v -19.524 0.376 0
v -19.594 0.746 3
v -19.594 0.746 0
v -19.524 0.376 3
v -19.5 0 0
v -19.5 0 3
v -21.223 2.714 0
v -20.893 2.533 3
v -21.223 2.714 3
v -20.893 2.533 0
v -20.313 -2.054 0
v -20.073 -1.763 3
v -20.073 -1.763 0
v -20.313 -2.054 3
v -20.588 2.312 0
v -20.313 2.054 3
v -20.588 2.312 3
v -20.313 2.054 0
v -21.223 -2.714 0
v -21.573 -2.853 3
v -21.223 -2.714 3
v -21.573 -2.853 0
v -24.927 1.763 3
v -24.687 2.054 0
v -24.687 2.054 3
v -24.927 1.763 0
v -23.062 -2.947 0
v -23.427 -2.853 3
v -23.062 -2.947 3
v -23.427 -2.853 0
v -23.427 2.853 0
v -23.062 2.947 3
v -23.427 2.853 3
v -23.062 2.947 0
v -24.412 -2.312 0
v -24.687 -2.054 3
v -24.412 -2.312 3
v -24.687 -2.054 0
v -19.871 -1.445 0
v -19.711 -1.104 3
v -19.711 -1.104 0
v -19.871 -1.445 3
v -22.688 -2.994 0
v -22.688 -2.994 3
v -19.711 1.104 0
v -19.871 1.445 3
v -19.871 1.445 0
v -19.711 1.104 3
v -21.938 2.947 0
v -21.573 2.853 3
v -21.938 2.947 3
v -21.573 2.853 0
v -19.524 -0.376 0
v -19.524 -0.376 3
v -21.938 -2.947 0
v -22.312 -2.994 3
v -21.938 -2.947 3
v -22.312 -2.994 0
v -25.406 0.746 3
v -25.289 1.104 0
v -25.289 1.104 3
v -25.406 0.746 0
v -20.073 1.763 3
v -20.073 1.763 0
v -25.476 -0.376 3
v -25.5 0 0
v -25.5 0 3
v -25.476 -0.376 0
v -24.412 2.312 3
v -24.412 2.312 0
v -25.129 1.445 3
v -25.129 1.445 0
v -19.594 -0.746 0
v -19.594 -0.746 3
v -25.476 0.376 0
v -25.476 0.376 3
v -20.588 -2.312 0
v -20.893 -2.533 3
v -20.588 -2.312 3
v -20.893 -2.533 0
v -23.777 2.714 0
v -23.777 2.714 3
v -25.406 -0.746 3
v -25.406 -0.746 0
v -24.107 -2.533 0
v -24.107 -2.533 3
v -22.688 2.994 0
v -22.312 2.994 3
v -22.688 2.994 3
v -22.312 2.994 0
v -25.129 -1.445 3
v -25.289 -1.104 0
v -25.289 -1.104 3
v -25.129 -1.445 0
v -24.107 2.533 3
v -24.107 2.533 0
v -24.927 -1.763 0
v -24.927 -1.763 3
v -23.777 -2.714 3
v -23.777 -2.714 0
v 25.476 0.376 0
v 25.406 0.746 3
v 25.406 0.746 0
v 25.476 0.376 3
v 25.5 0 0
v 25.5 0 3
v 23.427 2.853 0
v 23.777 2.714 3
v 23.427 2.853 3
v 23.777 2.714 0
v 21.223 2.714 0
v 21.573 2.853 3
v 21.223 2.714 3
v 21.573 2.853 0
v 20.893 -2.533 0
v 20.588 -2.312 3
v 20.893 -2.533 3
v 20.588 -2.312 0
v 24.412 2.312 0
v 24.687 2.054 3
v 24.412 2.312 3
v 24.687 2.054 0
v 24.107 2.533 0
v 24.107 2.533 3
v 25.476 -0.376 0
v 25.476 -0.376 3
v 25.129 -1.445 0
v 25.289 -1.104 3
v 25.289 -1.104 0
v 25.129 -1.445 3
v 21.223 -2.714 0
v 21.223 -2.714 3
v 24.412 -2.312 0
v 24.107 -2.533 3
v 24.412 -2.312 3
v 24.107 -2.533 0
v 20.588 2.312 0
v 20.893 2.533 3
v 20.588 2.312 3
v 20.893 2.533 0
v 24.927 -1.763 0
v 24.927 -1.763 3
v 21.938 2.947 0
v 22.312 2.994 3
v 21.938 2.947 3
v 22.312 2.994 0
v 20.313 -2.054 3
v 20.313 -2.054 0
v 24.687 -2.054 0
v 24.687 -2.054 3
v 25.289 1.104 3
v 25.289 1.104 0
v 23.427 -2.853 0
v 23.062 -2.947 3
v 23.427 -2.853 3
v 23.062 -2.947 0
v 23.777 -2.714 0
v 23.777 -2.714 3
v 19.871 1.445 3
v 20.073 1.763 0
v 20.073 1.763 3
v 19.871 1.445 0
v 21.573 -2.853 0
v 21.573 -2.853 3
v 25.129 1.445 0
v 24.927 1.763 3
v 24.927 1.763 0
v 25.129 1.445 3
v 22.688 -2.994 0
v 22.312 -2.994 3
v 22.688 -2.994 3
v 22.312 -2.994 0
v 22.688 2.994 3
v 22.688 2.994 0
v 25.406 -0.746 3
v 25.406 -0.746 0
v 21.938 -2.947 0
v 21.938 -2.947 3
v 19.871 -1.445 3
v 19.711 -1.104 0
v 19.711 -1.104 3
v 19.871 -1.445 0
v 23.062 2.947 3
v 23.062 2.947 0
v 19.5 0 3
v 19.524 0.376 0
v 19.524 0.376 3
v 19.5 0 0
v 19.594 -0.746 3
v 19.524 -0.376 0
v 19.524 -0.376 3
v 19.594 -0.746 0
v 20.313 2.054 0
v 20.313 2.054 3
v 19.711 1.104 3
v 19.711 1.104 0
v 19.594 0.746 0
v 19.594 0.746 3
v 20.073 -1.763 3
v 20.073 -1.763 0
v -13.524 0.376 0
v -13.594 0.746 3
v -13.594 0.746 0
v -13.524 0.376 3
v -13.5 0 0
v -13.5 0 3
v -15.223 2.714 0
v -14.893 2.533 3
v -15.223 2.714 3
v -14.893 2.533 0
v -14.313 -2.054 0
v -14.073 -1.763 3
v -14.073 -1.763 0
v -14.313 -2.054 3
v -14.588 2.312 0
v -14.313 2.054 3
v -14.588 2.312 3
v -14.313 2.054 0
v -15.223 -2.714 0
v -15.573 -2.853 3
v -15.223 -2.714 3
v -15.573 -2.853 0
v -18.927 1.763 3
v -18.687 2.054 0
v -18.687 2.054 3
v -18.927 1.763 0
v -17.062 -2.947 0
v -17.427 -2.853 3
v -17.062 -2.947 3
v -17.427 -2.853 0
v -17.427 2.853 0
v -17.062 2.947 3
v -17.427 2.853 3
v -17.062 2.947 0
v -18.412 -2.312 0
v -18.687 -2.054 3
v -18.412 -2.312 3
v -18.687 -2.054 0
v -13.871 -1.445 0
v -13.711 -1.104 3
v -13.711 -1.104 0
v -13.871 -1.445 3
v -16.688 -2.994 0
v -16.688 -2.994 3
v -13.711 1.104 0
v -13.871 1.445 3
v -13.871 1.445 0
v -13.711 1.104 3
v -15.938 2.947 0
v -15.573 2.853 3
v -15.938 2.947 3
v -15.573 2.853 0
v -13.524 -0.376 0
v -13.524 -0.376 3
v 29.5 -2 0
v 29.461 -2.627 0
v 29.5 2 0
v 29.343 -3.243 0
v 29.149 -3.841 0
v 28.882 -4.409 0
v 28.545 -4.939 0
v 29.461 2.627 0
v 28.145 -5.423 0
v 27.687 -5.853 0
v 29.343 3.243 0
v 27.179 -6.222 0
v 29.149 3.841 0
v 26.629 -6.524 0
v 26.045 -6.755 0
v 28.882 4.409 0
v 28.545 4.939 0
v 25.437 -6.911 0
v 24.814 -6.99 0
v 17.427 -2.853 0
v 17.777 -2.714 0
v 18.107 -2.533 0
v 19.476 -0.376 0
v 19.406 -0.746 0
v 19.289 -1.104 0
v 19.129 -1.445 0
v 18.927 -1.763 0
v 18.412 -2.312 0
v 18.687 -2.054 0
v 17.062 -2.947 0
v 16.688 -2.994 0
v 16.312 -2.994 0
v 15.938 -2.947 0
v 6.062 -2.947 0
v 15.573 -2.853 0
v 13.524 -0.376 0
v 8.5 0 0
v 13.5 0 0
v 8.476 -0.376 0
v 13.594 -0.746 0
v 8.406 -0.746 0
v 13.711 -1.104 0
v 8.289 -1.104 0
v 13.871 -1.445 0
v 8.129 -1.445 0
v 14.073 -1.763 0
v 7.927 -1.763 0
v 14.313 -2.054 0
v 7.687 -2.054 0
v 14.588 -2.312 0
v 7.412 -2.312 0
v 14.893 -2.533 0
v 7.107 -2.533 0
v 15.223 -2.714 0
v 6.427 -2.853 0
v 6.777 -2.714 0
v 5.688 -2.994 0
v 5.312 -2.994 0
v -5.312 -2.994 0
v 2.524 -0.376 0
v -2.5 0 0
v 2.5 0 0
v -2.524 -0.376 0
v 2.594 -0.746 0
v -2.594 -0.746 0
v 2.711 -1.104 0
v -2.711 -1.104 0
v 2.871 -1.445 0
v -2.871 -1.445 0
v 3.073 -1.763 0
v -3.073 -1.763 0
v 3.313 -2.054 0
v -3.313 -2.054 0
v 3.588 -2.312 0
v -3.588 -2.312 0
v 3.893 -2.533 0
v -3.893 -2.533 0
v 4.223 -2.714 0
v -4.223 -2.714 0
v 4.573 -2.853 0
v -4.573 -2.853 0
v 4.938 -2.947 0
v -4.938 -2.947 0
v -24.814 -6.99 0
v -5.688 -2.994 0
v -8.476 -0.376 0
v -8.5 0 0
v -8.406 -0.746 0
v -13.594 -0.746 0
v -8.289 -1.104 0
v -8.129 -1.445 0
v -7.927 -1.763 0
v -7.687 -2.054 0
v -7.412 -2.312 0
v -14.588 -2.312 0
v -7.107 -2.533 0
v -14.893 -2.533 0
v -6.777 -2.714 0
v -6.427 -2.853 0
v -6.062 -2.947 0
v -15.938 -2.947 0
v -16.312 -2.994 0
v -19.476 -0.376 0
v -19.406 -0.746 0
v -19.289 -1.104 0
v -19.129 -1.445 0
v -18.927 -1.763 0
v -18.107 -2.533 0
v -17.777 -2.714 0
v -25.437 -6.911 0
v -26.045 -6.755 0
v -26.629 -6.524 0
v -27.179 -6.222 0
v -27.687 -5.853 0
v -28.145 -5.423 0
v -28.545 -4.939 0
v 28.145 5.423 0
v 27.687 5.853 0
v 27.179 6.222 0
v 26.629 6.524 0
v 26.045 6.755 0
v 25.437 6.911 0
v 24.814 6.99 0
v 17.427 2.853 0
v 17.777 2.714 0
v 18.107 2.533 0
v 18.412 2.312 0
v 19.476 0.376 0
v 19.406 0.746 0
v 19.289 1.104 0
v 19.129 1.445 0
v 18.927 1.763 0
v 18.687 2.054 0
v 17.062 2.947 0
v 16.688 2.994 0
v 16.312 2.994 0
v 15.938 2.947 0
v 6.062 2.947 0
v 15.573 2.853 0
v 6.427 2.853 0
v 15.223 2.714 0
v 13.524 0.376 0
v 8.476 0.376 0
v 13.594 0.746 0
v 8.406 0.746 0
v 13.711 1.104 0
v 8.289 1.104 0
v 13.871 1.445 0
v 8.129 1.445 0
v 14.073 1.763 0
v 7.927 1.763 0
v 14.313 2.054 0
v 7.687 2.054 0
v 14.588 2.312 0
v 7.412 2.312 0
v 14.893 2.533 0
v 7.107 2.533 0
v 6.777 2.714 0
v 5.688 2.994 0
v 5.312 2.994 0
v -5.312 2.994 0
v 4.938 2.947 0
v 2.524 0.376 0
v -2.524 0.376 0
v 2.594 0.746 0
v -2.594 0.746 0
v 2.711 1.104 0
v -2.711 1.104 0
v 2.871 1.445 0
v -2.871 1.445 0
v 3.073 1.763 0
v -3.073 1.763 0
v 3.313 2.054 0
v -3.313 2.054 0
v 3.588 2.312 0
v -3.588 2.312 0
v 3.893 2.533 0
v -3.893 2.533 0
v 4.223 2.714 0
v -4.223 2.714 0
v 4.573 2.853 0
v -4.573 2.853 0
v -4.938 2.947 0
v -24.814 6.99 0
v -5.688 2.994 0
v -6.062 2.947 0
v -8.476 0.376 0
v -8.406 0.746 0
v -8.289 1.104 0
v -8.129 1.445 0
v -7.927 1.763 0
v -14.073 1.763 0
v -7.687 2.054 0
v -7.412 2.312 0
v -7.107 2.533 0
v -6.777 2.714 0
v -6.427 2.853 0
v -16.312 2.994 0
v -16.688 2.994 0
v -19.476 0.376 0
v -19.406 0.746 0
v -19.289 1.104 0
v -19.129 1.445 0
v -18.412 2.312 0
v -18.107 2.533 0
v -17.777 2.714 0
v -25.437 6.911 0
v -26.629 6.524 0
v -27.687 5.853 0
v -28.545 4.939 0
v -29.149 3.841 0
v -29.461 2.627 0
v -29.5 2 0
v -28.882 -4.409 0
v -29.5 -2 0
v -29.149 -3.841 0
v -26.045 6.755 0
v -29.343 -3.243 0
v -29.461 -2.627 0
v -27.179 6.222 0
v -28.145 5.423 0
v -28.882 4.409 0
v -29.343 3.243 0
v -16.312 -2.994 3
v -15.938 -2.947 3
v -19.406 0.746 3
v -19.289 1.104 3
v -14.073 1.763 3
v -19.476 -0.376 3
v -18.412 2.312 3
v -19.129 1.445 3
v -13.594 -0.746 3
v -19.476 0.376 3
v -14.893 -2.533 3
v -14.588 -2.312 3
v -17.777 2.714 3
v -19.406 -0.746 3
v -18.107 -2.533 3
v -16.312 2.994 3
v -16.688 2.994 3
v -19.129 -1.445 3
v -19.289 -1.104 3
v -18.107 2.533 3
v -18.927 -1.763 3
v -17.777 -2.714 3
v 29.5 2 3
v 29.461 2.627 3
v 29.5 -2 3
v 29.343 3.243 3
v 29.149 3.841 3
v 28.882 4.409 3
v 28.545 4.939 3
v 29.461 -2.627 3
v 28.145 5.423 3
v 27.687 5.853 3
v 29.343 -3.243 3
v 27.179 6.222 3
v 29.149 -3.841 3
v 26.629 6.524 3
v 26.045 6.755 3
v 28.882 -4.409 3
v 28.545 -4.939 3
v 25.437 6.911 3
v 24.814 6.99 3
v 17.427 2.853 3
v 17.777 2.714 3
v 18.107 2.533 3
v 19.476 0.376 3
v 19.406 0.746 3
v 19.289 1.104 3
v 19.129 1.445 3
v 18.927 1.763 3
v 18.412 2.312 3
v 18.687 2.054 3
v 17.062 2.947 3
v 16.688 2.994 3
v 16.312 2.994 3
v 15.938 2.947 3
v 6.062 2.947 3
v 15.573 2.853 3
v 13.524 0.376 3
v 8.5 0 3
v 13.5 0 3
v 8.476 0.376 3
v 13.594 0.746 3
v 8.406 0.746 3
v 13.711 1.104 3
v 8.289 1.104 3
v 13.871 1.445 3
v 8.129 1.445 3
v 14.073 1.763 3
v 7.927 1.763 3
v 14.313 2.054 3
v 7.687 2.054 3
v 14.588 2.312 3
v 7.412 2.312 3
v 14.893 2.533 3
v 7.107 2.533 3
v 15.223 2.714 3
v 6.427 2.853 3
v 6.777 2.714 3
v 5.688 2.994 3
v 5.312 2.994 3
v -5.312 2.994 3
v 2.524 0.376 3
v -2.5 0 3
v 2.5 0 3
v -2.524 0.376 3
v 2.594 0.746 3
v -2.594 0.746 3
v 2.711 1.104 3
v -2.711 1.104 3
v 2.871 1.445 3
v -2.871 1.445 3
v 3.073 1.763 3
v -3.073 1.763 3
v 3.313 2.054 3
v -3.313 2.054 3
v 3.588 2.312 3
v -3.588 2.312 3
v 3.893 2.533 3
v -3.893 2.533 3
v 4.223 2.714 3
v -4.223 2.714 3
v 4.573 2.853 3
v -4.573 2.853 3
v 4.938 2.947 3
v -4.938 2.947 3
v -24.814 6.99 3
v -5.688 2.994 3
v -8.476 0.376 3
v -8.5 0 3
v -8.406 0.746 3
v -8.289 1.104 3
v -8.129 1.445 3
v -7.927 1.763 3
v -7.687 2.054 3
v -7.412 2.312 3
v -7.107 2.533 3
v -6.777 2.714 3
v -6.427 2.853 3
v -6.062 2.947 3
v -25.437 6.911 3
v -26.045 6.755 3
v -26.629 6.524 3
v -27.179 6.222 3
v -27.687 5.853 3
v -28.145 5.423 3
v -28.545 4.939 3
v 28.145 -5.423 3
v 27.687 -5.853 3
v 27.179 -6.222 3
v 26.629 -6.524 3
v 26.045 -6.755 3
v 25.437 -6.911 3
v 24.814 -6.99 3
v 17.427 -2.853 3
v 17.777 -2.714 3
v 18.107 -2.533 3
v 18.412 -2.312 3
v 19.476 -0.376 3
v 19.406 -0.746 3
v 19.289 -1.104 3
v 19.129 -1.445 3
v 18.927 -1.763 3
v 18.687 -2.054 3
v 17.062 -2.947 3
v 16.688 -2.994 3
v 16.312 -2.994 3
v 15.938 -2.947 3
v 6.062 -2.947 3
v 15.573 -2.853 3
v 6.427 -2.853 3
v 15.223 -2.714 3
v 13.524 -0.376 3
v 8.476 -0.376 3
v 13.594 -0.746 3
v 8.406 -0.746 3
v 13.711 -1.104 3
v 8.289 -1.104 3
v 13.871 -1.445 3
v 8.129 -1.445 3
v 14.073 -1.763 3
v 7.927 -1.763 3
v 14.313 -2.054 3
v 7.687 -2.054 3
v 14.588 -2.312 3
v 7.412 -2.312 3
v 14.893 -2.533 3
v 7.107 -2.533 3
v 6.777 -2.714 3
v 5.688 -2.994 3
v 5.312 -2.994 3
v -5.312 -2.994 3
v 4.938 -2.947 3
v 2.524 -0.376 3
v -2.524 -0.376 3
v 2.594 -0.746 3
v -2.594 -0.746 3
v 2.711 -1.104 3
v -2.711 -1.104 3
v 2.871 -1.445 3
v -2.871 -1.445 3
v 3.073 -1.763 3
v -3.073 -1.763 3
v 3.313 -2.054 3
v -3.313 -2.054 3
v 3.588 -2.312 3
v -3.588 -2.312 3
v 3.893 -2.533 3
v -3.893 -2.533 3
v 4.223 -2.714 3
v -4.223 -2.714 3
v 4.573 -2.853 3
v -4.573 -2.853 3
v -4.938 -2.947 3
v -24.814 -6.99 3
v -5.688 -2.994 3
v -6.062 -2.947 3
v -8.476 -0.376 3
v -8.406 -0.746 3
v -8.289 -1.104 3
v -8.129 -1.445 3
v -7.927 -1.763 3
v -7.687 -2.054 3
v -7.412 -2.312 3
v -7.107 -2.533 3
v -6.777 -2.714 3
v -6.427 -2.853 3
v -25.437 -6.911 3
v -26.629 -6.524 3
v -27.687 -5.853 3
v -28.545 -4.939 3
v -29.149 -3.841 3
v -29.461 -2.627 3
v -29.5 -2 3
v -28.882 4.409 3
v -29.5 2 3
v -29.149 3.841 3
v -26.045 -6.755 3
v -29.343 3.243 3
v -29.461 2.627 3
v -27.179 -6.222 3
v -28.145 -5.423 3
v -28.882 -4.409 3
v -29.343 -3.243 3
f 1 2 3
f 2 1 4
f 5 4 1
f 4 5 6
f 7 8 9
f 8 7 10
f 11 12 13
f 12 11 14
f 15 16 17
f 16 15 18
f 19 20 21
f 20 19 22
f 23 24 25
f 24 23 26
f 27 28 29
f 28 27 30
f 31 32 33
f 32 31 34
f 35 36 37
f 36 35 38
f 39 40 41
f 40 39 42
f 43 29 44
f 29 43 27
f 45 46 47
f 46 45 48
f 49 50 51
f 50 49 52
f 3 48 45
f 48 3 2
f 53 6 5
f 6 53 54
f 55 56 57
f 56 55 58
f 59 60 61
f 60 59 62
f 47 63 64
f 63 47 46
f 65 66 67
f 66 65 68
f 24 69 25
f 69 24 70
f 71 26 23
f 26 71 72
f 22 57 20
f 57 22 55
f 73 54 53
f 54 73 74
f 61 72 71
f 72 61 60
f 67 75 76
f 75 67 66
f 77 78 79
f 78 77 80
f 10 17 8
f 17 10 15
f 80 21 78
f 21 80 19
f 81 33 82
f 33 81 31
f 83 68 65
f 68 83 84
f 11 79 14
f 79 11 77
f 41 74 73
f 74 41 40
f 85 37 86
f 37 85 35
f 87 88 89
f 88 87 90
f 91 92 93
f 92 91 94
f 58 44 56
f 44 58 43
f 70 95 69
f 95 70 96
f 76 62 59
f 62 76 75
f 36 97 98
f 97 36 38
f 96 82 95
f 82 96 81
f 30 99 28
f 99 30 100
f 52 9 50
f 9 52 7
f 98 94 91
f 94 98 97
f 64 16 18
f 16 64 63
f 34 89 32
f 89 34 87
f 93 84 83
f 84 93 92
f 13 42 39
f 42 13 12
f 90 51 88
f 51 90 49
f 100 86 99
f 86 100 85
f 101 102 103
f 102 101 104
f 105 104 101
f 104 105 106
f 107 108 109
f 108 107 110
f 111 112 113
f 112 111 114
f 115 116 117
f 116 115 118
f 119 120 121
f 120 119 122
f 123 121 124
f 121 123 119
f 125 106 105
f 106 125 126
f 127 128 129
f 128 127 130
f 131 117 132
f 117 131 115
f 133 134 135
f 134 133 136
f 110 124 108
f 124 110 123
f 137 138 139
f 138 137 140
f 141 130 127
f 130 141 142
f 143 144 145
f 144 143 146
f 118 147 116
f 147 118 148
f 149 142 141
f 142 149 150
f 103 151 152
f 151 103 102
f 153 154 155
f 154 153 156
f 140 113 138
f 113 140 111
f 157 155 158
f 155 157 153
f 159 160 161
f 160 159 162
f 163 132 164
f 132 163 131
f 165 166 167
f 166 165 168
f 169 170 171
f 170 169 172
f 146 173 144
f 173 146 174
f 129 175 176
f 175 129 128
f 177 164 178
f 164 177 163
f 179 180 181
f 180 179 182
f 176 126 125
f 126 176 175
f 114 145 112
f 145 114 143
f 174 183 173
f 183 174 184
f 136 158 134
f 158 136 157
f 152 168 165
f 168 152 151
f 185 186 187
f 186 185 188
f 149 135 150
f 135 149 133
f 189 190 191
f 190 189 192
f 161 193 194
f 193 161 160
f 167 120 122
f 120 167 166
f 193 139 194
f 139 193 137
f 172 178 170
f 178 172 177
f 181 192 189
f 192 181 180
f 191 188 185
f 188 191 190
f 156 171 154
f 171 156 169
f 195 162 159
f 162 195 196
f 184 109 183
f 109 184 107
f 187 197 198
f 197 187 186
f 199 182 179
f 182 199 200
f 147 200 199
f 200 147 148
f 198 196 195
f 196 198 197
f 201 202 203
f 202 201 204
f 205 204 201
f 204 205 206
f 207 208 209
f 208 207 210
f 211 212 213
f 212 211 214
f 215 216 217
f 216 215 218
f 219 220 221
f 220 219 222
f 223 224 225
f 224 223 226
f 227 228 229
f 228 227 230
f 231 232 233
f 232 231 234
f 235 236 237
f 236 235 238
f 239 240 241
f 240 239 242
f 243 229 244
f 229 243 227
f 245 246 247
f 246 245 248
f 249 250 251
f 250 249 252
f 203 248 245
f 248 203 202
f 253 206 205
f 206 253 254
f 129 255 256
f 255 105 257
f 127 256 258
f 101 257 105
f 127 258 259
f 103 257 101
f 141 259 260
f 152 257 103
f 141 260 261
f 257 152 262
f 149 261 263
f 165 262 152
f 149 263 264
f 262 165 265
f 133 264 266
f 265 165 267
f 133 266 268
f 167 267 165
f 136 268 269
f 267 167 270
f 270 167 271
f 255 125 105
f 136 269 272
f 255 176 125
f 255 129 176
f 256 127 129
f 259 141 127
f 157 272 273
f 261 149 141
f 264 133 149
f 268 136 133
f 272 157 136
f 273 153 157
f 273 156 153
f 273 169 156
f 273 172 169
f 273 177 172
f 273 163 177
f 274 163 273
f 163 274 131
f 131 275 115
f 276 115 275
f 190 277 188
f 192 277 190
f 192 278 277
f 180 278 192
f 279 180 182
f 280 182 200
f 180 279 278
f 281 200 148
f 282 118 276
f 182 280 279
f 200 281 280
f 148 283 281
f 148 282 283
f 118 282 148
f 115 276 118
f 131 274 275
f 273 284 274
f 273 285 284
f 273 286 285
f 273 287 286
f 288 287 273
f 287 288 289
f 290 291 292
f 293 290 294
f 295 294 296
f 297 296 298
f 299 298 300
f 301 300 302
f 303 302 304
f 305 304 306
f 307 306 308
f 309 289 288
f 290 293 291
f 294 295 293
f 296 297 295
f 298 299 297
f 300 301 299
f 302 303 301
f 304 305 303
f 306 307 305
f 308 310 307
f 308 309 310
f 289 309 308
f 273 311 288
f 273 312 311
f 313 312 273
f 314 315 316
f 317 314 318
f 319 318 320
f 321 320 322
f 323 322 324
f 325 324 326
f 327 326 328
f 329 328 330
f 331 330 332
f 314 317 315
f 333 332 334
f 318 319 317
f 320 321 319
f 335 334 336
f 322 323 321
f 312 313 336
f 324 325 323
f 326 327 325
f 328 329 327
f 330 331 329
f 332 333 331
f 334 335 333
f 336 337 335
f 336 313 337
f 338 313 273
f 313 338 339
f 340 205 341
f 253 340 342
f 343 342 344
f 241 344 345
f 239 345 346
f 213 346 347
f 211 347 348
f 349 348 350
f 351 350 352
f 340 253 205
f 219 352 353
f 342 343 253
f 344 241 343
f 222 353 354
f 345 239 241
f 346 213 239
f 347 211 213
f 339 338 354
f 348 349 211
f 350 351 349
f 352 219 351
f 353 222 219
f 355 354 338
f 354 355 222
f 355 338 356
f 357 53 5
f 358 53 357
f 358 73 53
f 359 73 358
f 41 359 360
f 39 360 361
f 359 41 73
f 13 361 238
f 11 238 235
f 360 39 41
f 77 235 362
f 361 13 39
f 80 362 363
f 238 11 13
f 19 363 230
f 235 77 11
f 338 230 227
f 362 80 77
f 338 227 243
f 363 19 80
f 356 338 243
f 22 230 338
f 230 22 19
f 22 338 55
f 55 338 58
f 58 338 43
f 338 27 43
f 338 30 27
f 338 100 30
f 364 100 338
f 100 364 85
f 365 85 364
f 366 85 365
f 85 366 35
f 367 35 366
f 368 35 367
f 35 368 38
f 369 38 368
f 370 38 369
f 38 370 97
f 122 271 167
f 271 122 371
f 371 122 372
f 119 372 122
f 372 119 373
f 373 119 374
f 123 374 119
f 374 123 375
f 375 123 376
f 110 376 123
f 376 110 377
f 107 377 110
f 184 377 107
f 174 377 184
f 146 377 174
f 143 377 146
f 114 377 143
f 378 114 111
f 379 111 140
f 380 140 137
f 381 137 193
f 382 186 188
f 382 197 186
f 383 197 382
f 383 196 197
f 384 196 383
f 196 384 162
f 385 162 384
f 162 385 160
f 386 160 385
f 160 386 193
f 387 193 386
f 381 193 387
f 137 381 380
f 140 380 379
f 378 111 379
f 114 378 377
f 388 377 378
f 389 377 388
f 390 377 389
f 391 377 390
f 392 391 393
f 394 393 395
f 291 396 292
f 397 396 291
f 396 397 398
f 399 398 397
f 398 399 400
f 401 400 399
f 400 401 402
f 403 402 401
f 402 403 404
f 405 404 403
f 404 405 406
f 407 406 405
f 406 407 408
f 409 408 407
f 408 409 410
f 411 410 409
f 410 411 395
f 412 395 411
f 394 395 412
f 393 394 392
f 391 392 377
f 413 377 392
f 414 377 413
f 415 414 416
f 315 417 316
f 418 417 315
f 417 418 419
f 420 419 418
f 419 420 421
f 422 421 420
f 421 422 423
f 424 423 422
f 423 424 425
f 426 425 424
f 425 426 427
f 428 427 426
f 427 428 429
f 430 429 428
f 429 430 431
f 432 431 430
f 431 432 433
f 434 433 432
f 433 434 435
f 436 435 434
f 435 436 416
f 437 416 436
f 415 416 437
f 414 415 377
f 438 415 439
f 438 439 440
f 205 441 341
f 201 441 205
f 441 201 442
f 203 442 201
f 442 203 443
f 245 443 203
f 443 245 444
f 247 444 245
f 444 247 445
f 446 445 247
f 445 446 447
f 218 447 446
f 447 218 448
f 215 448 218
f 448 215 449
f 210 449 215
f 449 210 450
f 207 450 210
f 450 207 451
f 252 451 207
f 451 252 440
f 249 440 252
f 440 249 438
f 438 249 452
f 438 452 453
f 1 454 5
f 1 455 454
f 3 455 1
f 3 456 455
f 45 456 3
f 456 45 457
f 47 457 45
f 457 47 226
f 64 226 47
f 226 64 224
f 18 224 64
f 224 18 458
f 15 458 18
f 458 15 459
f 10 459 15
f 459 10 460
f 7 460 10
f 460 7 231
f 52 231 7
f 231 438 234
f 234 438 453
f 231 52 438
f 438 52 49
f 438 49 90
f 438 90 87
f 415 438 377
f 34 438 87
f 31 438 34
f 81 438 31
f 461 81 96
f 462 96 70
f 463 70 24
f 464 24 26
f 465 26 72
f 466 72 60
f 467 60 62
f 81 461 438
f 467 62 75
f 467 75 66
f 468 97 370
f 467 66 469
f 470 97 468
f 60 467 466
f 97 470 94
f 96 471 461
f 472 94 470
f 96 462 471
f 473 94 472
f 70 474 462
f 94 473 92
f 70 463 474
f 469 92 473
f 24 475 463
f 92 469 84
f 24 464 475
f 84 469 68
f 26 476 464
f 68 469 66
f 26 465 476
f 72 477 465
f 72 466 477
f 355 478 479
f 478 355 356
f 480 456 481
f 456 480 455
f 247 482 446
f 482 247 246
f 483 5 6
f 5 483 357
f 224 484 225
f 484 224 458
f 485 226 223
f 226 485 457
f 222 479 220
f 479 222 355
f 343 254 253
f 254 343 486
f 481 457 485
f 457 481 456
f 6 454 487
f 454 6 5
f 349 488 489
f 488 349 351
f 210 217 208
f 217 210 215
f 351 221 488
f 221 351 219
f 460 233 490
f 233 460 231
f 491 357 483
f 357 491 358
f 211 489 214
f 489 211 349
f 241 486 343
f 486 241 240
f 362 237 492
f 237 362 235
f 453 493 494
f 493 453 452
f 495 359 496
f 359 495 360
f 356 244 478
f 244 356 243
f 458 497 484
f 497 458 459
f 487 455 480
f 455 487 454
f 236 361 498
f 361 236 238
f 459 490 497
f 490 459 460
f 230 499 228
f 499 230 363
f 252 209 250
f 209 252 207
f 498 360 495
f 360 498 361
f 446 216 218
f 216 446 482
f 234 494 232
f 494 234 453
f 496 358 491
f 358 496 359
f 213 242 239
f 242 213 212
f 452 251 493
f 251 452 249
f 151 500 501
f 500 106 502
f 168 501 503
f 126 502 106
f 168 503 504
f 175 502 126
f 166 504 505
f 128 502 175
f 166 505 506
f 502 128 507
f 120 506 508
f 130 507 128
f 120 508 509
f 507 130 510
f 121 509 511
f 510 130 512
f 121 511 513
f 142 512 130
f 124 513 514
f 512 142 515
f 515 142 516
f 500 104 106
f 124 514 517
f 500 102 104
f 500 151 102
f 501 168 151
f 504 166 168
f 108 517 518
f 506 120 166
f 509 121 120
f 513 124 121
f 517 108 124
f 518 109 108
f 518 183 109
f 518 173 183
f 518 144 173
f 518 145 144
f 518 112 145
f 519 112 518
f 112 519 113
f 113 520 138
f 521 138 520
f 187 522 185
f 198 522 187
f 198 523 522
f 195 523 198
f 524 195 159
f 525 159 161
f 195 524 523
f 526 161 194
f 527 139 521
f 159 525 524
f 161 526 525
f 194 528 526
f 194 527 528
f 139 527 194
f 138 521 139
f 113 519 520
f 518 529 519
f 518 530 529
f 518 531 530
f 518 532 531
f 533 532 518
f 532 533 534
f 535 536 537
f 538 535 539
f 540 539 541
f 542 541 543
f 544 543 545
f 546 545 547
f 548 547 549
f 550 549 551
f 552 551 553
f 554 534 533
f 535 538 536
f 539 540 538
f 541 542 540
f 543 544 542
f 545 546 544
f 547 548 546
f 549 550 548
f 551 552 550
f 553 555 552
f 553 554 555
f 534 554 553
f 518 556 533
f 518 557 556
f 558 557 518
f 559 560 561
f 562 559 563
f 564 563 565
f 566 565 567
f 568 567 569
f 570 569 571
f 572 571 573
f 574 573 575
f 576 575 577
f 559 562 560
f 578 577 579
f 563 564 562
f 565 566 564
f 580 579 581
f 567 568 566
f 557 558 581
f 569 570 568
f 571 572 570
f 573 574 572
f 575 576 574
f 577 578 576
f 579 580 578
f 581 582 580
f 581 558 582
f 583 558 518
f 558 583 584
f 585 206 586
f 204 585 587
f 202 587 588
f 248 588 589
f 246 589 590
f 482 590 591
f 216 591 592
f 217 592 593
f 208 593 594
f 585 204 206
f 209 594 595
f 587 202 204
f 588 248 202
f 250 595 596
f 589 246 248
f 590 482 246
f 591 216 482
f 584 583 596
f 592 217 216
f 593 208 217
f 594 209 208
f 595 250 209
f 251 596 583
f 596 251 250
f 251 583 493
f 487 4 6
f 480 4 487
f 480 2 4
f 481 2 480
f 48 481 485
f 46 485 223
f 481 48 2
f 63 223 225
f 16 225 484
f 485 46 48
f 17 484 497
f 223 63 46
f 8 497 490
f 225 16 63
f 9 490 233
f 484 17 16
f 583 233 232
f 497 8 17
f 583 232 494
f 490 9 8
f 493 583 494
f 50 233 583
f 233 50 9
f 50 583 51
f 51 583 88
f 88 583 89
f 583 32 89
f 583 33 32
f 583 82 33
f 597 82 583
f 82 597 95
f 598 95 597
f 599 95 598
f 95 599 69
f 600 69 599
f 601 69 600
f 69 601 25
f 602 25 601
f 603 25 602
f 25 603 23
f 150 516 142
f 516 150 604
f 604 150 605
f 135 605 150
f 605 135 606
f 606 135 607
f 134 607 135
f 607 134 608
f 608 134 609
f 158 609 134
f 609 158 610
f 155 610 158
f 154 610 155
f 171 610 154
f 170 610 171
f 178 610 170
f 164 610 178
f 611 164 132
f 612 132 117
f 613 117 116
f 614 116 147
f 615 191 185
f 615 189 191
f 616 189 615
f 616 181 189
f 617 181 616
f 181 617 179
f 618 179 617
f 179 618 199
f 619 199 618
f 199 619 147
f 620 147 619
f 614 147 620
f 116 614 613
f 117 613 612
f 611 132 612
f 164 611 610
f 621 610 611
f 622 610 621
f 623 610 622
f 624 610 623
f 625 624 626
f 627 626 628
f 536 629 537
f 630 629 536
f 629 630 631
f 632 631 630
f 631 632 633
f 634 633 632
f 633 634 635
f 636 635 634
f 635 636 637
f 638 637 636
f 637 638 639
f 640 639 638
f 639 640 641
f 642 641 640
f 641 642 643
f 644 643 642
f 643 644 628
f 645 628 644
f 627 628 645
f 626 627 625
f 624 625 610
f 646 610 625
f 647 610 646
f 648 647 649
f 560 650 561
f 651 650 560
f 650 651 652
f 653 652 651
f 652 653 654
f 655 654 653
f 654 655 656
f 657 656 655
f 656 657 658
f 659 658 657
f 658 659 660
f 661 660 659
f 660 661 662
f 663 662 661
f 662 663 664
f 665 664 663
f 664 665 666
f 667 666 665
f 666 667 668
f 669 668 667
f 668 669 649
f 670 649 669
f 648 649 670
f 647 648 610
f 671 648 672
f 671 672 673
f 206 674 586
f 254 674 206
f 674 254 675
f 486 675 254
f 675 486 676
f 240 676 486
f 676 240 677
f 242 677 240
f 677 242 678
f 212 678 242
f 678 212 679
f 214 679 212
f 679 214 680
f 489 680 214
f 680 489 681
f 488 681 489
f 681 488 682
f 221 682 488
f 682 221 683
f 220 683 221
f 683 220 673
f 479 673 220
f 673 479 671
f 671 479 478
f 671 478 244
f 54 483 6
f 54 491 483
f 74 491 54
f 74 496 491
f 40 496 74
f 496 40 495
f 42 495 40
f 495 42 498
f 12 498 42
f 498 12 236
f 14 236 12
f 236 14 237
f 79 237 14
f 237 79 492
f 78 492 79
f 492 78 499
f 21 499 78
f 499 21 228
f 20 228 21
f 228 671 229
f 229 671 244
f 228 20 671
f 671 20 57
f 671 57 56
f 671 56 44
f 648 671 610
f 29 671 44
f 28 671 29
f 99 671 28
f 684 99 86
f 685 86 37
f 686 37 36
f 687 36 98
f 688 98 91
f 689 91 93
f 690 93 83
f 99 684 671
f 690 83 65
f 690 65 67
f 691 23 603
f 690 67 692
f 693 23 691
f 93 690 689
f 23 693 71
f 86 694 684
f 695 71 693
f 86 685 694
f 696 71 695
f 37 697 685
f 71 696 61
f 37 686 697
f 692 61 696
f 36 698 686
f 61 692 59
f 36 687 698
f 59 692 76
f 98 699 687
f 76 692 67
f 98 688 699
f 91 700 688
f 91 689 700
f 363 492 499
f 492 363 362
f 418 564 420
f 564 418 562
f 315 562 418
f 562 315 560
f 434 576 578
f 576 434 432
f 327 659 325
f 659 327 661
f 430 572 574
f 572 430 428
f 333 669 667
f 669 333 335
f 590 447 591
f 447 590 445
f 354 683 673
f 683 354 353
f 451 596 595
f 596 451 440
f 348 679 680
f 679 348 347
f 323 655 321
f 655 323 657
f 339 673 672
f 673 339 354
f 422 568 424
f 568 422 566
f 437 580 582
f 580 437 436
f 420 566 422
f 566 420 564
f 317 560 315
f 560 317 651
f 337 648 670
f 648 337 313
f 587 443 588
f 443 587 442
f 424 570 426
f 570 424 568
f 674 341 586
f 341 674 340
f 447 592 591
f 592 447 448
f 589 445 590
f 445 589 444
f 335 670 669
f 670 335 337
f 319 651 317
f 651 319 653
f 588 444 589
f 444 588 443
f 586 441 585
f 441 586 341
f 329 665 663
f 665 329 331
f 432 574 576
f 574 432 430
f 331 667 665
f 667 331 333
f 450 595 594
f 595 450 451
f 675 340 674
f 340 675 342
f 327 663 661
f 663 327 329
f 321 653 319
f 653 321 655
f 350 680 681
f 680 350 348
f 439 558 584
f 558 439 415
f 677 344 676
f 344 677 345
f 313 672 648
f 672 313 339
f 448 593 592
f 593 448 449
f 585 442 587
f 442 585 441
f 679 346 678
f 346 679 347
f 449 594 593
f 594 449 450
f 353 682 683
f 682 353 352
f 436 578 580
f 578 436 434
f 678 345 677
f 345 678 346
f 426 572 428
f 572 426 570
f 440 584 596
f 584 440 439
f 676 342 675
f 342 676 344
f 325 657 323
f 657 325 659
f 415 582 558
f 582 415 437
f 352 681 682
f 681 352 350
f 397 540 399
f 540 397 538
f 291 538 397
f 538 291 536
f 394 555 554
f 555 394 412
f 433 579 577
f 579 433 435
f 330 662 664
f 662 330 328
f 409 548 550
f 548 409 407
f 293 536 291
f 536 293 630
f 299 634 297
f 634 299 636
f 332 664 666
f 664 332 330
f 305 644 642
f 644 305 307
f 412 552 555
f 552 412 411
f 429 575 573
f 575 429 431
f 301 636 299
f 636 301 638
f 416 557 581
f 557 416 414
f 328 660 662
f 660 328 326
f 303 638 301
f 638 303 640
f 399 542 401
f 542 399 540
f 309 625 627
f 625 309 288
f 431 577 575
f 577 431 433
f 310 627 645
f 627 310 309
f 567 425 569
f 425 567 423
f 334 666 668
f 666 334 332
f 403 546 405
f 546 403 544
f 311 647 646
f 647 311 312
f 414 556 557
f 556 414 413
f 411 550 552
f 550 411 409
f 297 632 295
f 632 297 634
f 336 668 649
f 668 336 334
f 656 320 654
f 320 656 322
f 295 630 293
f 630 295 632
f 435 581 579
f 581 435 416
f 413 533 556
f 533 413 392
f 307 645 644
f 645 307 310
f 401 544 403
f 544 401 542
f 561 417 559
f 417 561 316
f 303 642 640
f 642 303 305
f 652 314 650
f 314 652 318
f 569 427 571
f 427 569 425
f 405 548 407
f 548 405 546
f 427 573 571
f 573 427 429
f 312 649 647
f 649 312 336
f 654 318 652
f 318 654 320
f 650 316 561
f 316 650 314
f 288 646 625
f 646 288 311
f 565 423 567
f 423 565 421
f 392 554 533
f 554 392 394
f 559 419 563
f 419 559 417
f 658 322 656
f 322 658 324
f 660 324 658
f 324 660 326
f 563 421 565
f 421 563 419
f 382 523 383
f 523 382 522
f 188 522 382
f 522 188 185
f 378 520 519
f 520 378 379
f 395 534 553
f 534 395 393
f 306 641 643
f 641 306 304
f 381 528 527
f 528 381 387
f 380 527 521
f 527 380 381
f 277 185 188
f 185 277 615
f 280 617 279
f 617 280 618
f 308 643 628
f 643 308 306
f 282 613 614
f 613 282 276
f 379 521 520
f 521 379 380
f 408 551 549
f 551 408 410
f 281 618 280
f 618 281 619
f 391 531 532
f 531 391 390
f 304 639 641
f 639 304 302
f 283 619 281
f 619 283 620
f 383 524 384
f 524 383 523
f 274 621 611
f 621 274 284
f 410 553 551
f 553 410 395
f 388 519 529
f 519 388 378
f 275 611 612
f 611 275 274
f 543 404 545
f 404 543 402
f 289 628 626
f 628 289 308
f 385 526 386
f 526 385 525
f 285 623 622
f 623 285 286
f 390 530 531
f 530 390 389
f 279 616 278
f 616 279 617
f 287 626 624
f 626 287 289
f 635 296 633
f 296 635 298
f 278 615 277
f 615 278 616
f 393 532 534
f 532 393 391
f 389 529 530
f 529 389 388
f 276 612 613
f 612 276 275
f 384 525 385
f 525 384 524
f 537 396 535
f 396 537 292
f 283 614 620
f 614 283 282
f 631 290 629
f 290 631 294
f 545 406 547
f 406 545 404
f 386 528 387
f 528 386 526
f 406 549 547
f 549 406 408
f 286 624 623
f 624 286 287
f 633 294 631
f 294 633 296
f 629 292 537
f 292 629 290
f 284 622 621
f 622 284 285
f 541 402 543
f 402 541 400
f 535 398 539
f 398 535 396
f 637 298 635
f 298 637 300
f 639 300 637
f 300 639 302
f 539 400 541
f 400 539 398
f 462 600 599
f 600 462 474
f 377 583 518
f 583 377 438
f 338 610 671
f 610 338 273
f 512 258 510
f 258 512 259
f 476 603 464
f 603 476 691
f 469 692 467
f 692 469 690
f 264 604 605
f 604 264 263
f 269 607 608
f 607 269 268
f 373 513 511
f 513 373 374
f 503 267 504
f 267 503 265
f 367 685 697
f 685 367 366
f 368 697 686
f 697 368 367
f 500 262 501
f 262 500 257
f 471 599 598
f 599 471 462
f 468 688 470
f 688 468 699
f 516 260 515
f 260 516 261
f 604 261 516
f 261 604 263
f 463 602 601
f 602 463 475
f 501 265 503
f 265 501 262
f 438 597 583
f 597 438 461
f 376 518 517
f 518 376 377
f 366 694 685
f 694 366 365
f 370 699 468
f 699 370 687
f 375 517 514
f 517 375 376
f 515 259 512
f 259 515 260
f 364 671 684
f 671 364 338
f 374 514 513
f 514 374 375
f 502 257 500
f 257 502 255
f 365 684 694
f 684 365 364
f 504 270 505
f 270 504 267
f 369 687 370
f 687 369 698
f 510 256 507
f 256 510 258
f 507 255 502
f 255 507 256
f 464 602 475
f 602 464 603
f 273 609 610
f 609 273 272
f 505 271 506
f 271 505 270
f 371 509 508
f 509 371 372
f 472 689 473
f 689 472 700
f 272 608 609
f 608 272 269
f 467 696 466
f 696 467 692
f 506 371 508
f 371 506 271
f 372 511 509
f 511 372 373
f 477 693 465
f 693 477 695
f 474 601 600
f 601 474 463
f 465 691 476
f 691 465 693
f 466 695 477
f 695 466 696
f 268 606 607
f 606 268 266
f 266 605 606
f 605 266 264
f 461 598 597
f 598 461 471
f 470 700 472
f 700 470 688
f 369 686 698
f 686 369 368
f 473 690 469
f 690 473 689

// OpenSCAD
$fn = 50;


difference() {
	union() {
		hull() {
			translate(v = [-24.5000000000, 2.0000000000, 0]) {
				cylinder(h = 3, r = 5);
			}
			translate(v = [24.5000000000, 2.0000000000, 0]) {
				cylinder(h = 3, r = 5);
			}
			translate(v = [-24.5000000000, -2.0000000000, 0]) {
				cylinder(h = 3, r = 5);
			}
			translate(v = [24.5000000000, -2.0000000000, 0]) {
				cylinder(h = 3, r = 5);
			}
		}
	}
	union() {
		#translate(v = [-22.5000000000, 0.0000000000, -100.0000000000]) {
			cylinder(h = 200, r = 3.0000000000);
		}
		#translate(v = [-22.5000000000, 0.0000000000, -100.0000000000]) {
			cylinder(h = 200, r = 3.0000000000);
		}
		#translate(v = [22.5000000000, 0.0000000000, -100.0000000000]) {
			cylinder(h = 200, r = 3.0000000000);
		}
		#translate(v = [22.5000000000, 0.0000000000, -100.0000000000]) {
			cylinder(h = 200, r = 3.0000000000);
		}
		#translate(v = [-16.5000000000, 0, 0]) {
			cylinder(h = 3, r = 3.0000000000);
		}
		#translate(v = [-5.5000000000, 0, 0]) {
			cylinder(h = 3, r = 3.0000000000);
		}
		#translate(v = [5.5000000000, 0, 0]) {
			cylinder(h = 3, r = 3.0000000000);
		}
		#translate(v = [16.5000000000, 0, 0]) {
			cylinder(h = 3, r = 3.0000000000);
		}
	}
}
